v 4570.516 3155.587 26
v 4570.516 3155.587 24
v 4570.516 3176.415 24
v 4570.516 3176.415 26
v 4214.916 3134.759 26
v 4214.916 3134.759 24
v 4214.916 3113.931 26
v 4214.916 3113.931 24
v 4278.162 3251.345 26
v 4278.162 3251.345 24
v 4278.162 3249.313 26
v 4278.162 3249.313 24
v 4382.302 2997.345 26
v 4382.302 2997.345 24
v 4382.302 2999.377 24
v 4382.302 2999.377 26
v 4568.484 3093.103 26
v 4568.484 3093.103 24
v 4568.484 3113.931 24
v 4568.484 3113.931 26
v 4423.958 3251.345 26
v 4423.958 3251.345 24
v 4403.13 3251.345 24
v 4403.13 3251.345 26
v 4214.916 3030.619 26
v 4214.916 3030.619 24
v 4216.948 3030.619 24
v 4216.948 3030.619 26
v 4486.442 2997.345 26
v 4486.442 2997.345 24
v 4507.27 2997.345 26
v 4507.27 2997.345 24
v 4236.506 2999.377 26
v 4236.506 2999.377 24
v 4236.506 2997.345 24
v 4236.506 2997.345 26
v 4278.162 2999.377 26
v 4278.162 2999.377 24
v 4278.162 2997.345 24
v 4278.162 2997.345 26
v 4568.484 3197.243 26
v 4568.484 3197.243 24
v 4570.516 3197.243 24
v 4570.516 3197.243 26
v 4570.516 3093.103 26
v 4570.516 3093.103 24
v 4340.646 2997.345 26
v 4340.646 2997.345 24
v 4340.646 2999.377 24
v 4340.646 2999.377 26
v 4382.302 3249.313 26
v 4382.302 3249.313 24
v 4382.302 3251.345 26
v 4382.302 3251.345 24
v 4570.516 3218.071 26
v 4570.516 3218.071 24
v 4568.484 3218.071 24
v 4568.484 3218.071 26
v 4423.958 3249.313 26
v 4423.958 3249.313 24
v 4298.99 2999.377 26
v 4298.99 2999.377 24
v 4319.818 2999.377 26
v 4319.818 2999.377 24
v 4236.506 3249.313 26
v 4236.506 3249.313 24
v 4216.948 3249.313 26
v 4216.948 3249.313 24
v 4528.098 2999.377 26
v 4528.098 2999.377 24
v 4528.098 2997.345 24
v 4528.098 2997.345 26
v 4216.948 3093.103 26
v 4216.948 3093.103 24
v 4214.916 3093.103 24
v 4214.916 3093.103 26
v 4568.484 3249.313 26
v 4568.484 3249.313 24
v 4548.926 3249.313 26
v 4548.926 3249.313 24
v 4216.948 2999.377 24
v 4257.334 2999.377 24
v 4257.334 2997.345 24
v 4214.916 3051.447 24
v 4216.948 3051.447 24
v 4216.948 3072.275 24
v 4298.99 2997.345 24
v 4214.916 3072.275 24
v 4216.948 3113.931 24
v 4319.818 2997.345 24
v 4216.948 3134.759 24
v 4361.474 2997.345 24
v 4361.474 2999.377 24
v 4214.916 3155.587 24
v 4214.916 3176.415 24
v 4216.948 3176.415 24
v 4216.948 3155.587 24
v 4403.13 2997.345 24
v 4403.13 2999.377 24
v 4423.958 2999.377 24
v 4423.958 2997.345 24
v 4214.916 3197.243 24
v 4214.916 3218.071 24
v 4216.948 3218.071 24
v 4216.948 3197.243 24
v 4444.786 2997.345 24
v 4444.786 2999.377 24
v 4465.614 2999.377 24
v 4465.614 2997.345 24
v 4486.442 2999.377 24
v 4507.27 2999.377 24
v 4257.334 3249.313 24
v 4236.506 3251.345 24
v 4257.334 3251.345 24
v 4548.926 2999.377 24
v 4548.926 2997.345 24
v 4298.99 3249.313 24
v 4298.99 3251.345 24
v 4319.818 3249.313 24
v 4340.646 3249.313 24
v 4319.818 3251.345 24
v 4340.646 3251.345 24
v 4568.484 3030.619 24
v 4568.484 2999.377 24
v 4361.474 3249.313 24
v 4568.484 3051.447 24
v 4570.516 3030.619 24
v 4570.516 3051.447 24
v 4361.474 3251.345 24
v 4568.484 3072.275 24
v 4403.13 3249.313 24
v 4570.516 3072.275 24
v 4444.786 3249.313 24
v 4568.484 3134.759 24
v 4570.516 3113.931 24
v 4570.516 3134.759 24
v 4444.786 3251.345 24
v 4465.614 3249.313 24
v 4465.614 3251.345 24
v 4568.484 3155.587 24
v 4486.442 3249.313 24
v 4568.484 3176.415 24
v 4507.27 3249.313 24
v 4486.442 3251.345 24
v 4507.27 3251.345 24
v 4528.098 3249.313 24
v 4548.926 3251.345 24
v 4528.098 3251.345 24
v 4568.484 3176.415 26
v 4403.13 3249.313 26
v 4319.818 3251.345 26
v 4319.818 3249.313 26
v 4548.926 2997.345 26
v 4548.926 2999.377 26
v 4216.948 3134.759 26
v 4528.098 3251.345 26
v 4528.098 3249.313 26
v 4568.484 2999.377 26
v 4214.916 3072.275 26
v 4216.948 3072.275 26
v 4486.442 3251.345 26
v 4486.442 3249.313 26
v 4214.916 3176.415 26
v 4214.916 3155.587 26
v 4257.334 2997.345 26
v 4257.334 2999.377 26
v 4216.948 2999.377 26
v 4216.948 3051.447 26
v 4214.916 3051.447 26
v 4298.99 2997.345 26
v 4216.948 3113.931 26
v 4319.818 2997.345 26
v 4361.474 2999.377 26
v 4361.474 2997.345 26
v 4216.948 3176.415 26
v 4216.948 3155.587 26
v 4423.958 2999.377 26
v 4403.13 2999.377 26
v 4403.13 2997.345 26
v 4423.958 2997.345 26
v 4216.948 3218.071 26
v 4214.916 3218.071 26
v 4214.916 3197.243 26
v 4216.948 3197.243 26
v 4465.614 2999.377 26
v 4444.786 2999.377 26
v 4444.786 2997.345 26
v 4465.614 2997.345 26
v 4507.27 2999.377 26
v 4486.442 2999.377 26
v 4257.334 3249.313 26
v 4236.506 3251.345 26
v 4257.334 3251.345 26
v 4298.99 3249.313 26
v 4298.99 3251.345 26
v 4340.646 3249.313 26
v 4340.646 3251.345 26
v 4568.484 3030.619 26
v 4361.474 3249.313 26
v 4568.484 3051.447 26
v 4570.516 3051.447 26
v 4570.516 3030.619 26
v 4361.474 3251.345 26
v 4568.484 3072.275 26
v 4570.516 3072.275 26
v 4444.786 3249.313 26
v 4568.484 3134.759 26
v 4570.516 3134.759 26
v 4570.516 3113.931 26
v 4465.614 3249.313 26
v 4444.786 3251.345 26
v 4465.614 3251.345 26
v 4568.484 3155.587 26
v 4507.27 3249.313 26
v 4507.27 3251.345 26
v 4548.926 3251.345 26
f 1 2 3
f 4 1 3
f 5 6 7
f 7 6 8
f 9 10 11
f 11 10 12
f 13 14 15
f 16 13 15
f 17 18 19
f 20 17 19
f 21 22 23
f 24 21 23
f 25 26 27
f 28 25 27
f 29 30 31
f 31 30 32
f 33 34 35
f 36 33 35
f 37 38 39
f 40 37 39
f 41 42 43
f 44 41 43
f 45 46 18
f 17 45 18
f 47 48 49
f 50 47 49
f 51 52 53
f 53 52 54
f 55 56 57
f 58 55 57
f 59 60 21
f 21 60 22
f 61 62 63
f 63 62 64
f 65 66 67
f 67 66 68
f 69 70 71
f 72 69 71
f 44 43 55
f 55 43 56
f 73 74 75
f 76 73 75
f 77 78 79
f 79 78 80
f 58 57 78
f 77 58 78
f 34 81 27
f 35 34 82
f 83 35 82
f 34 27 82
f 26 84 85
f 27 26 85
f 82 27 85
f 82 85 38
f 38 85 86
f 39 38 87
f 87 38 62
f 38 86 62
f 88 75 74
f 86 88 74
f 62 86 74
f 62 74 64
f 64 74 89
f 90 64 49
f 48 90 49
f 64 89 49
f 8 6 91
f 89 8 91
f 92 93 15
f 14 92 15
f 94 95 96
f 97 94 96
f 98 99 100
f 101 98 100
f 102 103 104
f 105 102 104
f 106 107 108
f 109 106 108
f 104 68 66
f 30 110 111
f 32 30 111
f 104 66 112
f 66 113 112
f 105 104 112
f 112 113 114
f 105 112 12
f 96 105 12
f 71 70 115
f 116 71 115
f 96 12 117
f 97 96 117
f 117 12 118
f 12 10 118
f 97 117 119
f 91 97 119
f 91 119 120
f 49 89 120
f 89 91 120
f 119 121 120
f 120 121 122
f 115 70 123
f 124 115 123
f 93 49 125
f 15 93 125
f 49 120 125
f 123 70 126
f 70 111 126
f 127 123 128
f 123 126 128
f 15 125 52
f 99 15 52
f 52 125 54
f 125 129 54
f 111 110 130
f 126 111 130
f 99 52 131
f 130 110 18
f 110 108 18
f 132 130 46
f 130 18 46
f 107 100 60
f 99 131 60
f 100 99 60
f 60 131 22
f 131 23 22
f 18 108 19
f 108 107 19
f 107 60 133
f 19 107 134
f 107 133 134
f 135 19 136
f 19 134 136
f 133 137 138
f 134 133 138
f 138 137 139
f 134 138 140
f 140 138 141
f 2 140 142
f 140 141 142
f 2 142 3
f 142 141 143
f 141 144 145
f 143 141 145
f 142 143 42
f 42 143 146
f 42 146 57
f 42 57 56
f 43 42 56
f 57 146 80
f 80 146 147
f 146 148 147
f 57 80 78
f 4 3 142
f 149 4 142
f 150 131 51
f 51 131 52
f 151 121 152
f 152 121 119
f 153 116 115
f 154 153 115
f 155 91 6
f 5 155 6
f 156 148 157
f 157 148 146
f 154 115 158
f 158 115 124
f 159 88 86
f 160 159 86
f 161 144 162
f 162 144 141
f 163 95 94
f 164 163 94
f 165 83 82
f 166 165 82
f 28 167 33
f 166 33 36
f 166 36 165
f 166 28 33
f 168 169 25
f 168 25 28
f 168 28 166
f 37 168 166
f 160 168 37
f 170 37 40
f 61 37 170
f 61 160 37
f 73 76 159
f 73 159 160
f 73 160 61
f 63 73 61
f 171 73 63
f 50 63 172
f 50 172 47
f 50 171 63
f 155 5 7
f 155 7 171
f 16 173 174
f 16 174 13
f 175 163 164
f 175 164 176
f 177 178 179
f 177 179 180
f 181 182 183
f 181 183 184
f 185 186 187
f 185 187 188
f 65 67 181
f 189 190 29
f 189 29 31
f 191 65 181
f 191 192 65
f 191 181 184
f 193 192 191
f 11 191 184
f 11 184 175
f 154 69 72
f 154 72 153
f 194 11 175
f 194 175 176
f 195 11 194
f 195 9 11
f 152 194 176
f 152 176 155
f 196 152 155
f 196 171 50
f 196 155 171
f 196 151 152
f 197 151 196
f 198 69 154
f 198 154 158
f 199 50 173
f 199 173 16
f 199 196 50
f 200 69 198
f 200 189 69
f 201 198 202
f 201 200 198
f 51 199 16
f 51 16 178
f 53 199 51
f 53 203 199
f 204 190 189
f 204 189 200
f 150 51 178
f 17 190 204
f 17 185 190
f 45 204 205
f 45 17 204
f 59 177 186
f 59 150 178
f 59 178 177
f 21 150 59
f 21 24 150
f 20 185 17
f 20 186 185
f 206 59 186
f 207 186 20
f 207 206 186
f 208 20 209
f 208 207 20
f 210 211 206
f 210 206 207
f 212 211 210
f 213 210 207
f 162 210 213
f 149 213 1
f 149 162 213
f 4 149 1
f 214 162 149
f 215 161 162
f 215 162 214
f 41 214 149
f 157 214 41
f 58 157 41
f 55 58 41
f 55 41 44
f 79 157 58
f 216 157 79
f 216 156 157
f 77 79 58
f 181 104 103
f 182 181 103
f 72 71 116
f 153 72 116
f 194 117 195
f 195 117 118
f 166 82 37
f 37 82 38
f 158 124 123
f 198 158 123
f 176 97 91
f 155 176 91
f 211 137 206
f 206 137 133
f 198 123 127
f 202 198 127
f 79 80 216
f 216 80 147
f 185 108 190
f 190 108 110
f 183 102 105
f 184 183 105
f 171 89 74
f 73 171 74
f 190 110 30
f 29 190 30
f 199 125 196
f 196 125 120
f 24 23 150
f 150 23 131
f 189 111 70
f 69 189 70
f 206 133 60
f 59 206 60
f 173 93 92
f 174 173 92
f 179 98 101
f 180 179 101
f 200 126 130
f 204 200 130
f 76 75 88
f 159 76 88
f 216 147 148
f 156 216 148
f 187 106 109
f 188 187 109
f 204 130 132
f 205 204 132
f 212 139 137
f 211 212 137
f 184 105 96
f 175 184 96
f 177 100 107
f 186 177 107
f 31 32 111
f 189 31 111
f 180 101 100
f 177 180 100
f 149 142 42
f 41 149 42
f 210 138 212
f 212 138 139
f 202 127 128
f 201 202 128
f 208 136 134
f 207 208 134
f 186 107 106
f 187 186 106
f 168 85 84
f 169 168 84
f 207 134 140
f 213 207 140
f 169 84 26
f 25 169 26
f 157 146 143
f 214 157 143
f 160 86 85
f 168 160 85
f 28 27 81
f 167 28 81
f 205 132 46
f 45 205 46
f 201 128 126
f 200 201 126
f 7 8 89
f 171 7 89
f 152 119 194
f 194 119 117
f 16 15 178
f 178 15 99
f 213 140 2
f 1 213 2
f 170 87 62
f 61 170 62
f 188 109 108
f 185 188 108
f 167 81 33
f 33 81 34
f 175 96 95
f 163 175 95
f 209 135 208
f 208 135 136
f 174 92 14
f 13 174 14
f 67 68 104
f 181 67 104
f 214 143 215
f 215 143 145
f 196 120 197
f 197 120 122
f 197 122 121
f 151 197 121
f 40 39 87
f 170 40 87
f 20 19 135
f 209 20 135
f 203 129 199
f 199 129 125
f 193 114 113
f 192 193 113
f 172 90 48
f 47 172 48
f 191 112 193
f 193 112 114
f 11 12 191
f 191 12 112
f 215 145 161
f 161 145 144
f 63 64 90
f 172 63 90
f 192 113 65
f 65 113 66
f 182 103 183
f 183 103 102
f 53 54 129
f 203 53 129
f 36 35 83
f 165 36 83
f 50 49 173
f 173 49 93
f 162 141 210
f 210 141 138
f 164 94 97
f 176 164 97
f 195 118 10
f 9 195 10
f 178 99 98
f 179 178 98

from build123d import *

# Parameters (mm, degrees)
BOSS_EXTRUDE1_DEPTH = 50
SCALE1_SCALE        = 0.04


with BuildPart() as part:
    # Sketch1 → Boss-Extrude1 (new body)
    with BuildSketch(Plane.XY):
        Polygon((-1.484062936, 0.145079086), (487.465937064, 0.145079086), (487.465937064, -50.654920914), (1008.165937064, -50.654920914), (1008.165937064, 0.145079086), (1528.865937064, 0.145079086), (1528.865937064, -50.654920914), (2049.565937064, -50.654920914), (2049.565937064, 0.145079086), (2570.265937064, 0.145079086), (2570.265937064, -50.654920914), (3090.965937064, -50.654920914), (3090.965937064, 0.145079086), (3611.665937064, 0.145079086), (3611.665937064, -50.654920914), (4132.365937064, -50.654920914), (4132.365937064, 0.145079086), (4653.065937064, 0.145079086), (4653.065937064, -50.654920914), (5173.765937064, -50.654920914), (5173.765937064, 0.145079086), (5694.465937064, 0.145079086), (5694.465937064, -50.654920914), (6215.165937064, -50.654920914), (6215.165937064, 0.145079086), (6735.865937064, 0.145079086), (6735.865937064, -50.654920914), (7256.565937064, -50.654920914), (7256.565937064, 0.145079086), (7777.265937064, 0.145079086), (7777.265937064, -50.654920914), (8297.965937064, -50.654920914), (8297.965937064, 0.145079086), (8786.915937064, 0.145079086), (8786.915937064, 781.195079086), (8837.715937064, 781.195079086), (8837.715937064, 1301.895079086), (8786.915937064, 1301.895079086), (8786.915937064, 1822.595079086), (8837.715937064, 1822.595079086), (8837.715937064, 2343.295079086), (8786.915937064, 2343.295079086), (8786.915937064, 2863.995079086), (8837.715937064, 2863.995079086), (8837.715937064, 3384.695079086), (8786.915937064, 3384.695079086), (8786.915937064, 3905.395079086), (8837.715937064, 3905.395079086), (8837.715937064, 4426.095079086), (8786.915937064, 4426.095079086), (8786.915937064, 4946.795079086), (8837.715937064, 4946.795079086), (8837.715937064, 5467.495079086), (8786.915937064, 5467.495079086), (8786.915937064, 5988.195079086), (8786.915937064, 6248.545079086), (8297.965937064, 6248.545079086), (8297.965937064, 6299.345079086), (7777.265937064, 6299.345079086), (7777.265937064, 6248.545079086), (7256.565937064, 6248.545079086), (7256.565937064, 6299.345079086), (6735.865937064, 6299.345079086), (6735.865937064, 6248.545079086), (6215.165937064, 6248.545079086), (6215.165937064, 6299.345079086), (5694.465937064, 6299.345079086), (5694.465937064, 6248.545079086), (5173.765937064, 6248.545079086), (5173.765937064, 6299.345079086), (4653.065937064, 6299.345079086), (4653.065937064, 6248.545079086), (4132.365937064, 6248.545079086), (4132.365937064, 6299.345079086), (3611.665937064, 6299.345079086), (3611.665937064, 6248.545079086), (3090.965937064, 6248.545079086), (3090.965937064, 6299.345079086), (2570.265937064, 6299.345079086), (2570.265937064, 6248.545079086), (2049.565937064, 6248.545079086), (2049.565937064, 6299.345079086), (1528.865937064, 6299.345079086), (1528.865937064, 6248.545079086), (1008.165937064, 6248.545079086), (1008.165937064, 6299.345079086), (487.465937064, 6299.345079086), (487.465937064, 6248.545079086), (-1.484062936, 6248.545079086), (-1.484062936, 5467.495079086), (-52.284062936, 5467.495079086), (-52.284062936, 4946.795079086), (-1.484062936, 4946.795079086), (-1.484062936, 4426.095079086), (-52.284062936, 4426.095079086), (-52.284062936, 3905.395079086), (-1.484062936, 3905.395079086), (-1.484062936, 3384.695079086), (-52.284062936, 3384.695079086), (-52.284062936, 2863.995079086), (-1.484062936, 2863.995079086), (-1.484062936, 2343.295079086), (-52.284062936, 2343.295079086), (-52.284062936, 1822.595079086), (-1.484062936, 1822.595079086), (-1.484062936, 1301.895079086), (-52.284062936, 1301.895079086), (-52.284062936, 781.195079086), (-1.484062936, 781.195079086), (-1.484062936, 260.495079086), align=None)
    extrude(amount=BOSS_EXTRUDE1_DEPTH)


with BuildPart() as part_1:
    # Scale1: scaled about (4392.715937064, 3124.345079086, 25)
    add(part.part.scale(SCALE1_SCALE).moved(Location((4217.007299581, 2999.371275923, 24))))


solid = part_1.part
